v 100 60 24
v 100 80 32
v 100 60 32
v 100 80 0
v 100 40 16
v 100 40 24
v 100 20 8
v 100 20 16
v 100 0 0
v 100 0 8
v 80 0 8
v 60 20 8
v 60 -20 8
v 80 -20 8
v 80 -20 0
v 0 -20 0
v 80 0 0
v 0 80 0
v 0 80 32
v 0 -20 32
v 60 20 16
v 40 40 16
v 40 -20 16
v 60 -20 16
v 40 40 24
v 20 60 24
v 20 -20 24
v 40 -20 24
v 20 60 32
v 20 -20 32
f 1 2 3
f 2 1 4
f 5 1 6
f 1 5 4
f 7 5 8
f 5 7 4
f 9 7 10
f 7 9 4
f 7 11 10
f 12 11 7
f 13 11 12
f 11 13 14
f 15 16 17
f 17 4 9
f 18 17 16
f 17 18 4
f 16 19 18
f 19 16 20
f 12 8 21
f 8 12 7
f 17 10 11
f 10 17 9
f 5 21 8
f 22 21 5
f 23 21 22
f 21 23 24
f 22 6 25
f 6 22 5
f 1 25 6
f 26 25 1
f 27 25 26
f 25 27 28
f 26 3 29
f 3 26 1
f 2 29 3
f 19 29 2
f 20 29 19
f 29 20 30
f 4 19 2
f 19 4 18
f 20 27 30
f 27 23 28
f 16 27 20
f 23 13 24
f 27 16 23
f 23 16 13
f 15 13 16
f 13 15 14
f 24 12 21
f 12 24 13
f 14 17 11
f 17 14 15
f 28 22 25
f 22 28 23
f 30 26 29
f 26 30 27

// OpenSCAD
/*MAIN PARAMETERS*/
number_steps = 4;
step_z = 8; //height of each step (+fencing)
step_x = 100; //length of each step (+fencing)
step_y = 20; //depth of each step (+fencing)
   

/*FENCING RELATED PARAMS*/
add_front_fencing = 0; //[0:false,1:true]
add_left_fencing = 0; //[0:false,1:true]
add_right_fencing = 0; //[0:false,1:true] 
rounded_fencing = 1; //[0:false,1:true]
fence_thickness = 2;
fence_height = 2;

fence_radius = fence_thickness/2;

/*GUTTER RELATED PARAMS*/
add_gutter = 0 ; //[0:false,1:true]
gutter_radius = 2;
add_y_gutter = 0; //[0:false,1:true]
number_y_gutter = 5; 
gutter_gap =3;

corner_stairs();

module corner_stairs(){
     
    total_y = number_steps*step_y;
    x_y_diff = total_y-step_x;
    
    //right stairs 
    stairs_w_gutter(false);  
    //left stairs
    rotate([0,0,90])
    translate([x_y_diff,-total_y,0])
    stairs_w_gutter(true); 
}
 
module stairs_w_gutter(is_left){
if(add_gutter){ 
    difference() {
        stairs(is_left);
        
        for ( i = [0: number_steps]){ 
            
            translated_y = (i ) * step_y; 
            translate([gutter_gap, translated_y, 0]){ 
                spacerX();
            }
        }  
        if(add_y_gutter){ 
            spacing = step_x / number_y_gutter;
            height = number_steps * step_y;
        
            for ( i = [0: number_y_gutter]){ 
                
            translated_x = (i ) * spacing; 
                translate([translated_x, gutter_gap, 0]){ 
                     
                        spacerY(height);
                     
                }
            }
        }
    }
}else{
    stairs(is_left); 
}
}
 


module stairs(is_left){ 
    for ( i = [1: number_steps]){ 
     stairs_y = (i-1) * step_y;
     height = i * step_z;  
        translate([0, stairs_y, 0]){ 
            cube([step_x, step_y, height]); 
            
           fencing(i, is_left, height);
        }    
    }
}

/*FENCING RELATED*/
module fencing(i, is_left, height){
    total_height = fence_height+height ; 
    if(add_front_fencing){
        front_fence(i, total_height, is_left);
    }
    if(add_left_fencing && is_left){
        side_fence(total_height);
    }
    if(add_right_fencing && !is_left){
        translate([step_x-fence_thickness,0,0])
        side_fence(total_height);
    }
}

module front_fence(index, total_height, is_left){
     
    if(rounded_fencing){
          
        height_offset =total_height-fence_radius;  
        if(is_left){
            left_offset = add_left_fencing? fence_radius :0; 
            length  = index*step_y +fence_radius - left_offset;
            
            
            translate([left_offset,0,0]){
                
                //bottom_fence
                cube ([length,fence_thickness, height_offset]);
                //top fence
                translate([0,fence_radius, height_offset])
                rotate([0,90,0])
                cylinder(d=fence_thickness,h= length);
            }
        }else { 
            right_offset = add_right_fencing? fence_radius :0; 
            length  = index*step_y +fence_radius - right_offset;
            
            shift = step_x-length-right_offset;
            translate([shift,0,0]){ 
                cube ([length,fence_thickness, height_offset]);
                
                //top fence
                translate([0,fence_radius, height_offset])
                rotate([0,90,0])
                cylinder(d=fence_thickness,h= length);
            }
            
            //corner post 
            translate([shift,fence_radius,0]){
            cylinder(d=fence_thickness, h=height_offset );
                translate([0,0,height_offset])
                sphere(d=fence_thickness);
            }
        }
        
        /*
        length_offset = 
        (add_left_fencing && add_right_fencing) ? fence_thickness 
        : (add_left_fencing || add_right_fencing) ? fence_radius
        : 0;  
        height_offset =total_height-fence_radius-length_offset;  
        left_offset = (add_left_fencing)? fence_radius :0;
        
        x_length = index*step_y + fence_radius; 
        height_offset =total_height-fence_radius;
        //top round portion
        translate([fence_radius,fence_radius, height_offset])
        rotate([0,90,0])
        cylinder(d=fence_thickness,h= step_x-fence_thickness);
        //bottom fence
        translate([fence_radius,0,0])
        cube([step_x-fence_thickness,  fence_thickness, height_offset]); 
        
        if( is_left){
            //corner post 2
            translate([fence_radius,fence_radius,0]){
                cylinder(d=fence_thickness, h=height_offset);
                translate([0,0,height_offset])
                sphere(d=fence_thickness);
            }
        }else{
            //corner post 1
            translate([ step_x-fence_radius,fence_radius,0]){ 
                cylinder(d=fence_thickness, h=height_offset);
                translate([0,0,height_offset])
                sphere(d=fence_thickness);
            }
        
        } 
        */
    } else{
        
        x_length = index*step_y + fence_thickness;
        if(is_left){
            cube([x_length,  fence_thickness, total_height]);
        }else{
            translate([step_x-x_length,0,0])
            cube([x_length,  fence_thickness, total_height]);
        }
        
    }
}

module side_fence(total_height){
    if(rounded_fencing){ 
        height_offset =total_height-fence_radius;
        translate([fence_radius ,fence_radius, height_offset]){
            //top round portion
            rotate([-90,0,0])
            cylinder(d=fence_thickness,h= step_y-fence_radius);
            //corner sphere
            sphere(d=fence_thickness);
            
        }
        //bottom fence
        translate([0,fence_radius,0])
        cube([fence_thickness, step_y-fence_radius, height_offset]);
        //corner post
        translate([fence_radius,fence_radius,0])
        cylinder(d=fence_thickness, h=height_offset);
        
    }else {
       cube([fence_thickness, step_y, total_height]);
    }
    
}

/*GUTTER RELATED*/
module spacerX(){  
    rotate([0,90,0]){ 
        cylinder( step_x-2*gutter_gap, gutter_radius, gutter_radius);
        
    } 
}

module spacerY(height){  
    rotate([-90,0,0]){ 
        cylinder( height-2*gutter_gap, gutter_radius, gutter_radius);
         
    } 
}
 
   
